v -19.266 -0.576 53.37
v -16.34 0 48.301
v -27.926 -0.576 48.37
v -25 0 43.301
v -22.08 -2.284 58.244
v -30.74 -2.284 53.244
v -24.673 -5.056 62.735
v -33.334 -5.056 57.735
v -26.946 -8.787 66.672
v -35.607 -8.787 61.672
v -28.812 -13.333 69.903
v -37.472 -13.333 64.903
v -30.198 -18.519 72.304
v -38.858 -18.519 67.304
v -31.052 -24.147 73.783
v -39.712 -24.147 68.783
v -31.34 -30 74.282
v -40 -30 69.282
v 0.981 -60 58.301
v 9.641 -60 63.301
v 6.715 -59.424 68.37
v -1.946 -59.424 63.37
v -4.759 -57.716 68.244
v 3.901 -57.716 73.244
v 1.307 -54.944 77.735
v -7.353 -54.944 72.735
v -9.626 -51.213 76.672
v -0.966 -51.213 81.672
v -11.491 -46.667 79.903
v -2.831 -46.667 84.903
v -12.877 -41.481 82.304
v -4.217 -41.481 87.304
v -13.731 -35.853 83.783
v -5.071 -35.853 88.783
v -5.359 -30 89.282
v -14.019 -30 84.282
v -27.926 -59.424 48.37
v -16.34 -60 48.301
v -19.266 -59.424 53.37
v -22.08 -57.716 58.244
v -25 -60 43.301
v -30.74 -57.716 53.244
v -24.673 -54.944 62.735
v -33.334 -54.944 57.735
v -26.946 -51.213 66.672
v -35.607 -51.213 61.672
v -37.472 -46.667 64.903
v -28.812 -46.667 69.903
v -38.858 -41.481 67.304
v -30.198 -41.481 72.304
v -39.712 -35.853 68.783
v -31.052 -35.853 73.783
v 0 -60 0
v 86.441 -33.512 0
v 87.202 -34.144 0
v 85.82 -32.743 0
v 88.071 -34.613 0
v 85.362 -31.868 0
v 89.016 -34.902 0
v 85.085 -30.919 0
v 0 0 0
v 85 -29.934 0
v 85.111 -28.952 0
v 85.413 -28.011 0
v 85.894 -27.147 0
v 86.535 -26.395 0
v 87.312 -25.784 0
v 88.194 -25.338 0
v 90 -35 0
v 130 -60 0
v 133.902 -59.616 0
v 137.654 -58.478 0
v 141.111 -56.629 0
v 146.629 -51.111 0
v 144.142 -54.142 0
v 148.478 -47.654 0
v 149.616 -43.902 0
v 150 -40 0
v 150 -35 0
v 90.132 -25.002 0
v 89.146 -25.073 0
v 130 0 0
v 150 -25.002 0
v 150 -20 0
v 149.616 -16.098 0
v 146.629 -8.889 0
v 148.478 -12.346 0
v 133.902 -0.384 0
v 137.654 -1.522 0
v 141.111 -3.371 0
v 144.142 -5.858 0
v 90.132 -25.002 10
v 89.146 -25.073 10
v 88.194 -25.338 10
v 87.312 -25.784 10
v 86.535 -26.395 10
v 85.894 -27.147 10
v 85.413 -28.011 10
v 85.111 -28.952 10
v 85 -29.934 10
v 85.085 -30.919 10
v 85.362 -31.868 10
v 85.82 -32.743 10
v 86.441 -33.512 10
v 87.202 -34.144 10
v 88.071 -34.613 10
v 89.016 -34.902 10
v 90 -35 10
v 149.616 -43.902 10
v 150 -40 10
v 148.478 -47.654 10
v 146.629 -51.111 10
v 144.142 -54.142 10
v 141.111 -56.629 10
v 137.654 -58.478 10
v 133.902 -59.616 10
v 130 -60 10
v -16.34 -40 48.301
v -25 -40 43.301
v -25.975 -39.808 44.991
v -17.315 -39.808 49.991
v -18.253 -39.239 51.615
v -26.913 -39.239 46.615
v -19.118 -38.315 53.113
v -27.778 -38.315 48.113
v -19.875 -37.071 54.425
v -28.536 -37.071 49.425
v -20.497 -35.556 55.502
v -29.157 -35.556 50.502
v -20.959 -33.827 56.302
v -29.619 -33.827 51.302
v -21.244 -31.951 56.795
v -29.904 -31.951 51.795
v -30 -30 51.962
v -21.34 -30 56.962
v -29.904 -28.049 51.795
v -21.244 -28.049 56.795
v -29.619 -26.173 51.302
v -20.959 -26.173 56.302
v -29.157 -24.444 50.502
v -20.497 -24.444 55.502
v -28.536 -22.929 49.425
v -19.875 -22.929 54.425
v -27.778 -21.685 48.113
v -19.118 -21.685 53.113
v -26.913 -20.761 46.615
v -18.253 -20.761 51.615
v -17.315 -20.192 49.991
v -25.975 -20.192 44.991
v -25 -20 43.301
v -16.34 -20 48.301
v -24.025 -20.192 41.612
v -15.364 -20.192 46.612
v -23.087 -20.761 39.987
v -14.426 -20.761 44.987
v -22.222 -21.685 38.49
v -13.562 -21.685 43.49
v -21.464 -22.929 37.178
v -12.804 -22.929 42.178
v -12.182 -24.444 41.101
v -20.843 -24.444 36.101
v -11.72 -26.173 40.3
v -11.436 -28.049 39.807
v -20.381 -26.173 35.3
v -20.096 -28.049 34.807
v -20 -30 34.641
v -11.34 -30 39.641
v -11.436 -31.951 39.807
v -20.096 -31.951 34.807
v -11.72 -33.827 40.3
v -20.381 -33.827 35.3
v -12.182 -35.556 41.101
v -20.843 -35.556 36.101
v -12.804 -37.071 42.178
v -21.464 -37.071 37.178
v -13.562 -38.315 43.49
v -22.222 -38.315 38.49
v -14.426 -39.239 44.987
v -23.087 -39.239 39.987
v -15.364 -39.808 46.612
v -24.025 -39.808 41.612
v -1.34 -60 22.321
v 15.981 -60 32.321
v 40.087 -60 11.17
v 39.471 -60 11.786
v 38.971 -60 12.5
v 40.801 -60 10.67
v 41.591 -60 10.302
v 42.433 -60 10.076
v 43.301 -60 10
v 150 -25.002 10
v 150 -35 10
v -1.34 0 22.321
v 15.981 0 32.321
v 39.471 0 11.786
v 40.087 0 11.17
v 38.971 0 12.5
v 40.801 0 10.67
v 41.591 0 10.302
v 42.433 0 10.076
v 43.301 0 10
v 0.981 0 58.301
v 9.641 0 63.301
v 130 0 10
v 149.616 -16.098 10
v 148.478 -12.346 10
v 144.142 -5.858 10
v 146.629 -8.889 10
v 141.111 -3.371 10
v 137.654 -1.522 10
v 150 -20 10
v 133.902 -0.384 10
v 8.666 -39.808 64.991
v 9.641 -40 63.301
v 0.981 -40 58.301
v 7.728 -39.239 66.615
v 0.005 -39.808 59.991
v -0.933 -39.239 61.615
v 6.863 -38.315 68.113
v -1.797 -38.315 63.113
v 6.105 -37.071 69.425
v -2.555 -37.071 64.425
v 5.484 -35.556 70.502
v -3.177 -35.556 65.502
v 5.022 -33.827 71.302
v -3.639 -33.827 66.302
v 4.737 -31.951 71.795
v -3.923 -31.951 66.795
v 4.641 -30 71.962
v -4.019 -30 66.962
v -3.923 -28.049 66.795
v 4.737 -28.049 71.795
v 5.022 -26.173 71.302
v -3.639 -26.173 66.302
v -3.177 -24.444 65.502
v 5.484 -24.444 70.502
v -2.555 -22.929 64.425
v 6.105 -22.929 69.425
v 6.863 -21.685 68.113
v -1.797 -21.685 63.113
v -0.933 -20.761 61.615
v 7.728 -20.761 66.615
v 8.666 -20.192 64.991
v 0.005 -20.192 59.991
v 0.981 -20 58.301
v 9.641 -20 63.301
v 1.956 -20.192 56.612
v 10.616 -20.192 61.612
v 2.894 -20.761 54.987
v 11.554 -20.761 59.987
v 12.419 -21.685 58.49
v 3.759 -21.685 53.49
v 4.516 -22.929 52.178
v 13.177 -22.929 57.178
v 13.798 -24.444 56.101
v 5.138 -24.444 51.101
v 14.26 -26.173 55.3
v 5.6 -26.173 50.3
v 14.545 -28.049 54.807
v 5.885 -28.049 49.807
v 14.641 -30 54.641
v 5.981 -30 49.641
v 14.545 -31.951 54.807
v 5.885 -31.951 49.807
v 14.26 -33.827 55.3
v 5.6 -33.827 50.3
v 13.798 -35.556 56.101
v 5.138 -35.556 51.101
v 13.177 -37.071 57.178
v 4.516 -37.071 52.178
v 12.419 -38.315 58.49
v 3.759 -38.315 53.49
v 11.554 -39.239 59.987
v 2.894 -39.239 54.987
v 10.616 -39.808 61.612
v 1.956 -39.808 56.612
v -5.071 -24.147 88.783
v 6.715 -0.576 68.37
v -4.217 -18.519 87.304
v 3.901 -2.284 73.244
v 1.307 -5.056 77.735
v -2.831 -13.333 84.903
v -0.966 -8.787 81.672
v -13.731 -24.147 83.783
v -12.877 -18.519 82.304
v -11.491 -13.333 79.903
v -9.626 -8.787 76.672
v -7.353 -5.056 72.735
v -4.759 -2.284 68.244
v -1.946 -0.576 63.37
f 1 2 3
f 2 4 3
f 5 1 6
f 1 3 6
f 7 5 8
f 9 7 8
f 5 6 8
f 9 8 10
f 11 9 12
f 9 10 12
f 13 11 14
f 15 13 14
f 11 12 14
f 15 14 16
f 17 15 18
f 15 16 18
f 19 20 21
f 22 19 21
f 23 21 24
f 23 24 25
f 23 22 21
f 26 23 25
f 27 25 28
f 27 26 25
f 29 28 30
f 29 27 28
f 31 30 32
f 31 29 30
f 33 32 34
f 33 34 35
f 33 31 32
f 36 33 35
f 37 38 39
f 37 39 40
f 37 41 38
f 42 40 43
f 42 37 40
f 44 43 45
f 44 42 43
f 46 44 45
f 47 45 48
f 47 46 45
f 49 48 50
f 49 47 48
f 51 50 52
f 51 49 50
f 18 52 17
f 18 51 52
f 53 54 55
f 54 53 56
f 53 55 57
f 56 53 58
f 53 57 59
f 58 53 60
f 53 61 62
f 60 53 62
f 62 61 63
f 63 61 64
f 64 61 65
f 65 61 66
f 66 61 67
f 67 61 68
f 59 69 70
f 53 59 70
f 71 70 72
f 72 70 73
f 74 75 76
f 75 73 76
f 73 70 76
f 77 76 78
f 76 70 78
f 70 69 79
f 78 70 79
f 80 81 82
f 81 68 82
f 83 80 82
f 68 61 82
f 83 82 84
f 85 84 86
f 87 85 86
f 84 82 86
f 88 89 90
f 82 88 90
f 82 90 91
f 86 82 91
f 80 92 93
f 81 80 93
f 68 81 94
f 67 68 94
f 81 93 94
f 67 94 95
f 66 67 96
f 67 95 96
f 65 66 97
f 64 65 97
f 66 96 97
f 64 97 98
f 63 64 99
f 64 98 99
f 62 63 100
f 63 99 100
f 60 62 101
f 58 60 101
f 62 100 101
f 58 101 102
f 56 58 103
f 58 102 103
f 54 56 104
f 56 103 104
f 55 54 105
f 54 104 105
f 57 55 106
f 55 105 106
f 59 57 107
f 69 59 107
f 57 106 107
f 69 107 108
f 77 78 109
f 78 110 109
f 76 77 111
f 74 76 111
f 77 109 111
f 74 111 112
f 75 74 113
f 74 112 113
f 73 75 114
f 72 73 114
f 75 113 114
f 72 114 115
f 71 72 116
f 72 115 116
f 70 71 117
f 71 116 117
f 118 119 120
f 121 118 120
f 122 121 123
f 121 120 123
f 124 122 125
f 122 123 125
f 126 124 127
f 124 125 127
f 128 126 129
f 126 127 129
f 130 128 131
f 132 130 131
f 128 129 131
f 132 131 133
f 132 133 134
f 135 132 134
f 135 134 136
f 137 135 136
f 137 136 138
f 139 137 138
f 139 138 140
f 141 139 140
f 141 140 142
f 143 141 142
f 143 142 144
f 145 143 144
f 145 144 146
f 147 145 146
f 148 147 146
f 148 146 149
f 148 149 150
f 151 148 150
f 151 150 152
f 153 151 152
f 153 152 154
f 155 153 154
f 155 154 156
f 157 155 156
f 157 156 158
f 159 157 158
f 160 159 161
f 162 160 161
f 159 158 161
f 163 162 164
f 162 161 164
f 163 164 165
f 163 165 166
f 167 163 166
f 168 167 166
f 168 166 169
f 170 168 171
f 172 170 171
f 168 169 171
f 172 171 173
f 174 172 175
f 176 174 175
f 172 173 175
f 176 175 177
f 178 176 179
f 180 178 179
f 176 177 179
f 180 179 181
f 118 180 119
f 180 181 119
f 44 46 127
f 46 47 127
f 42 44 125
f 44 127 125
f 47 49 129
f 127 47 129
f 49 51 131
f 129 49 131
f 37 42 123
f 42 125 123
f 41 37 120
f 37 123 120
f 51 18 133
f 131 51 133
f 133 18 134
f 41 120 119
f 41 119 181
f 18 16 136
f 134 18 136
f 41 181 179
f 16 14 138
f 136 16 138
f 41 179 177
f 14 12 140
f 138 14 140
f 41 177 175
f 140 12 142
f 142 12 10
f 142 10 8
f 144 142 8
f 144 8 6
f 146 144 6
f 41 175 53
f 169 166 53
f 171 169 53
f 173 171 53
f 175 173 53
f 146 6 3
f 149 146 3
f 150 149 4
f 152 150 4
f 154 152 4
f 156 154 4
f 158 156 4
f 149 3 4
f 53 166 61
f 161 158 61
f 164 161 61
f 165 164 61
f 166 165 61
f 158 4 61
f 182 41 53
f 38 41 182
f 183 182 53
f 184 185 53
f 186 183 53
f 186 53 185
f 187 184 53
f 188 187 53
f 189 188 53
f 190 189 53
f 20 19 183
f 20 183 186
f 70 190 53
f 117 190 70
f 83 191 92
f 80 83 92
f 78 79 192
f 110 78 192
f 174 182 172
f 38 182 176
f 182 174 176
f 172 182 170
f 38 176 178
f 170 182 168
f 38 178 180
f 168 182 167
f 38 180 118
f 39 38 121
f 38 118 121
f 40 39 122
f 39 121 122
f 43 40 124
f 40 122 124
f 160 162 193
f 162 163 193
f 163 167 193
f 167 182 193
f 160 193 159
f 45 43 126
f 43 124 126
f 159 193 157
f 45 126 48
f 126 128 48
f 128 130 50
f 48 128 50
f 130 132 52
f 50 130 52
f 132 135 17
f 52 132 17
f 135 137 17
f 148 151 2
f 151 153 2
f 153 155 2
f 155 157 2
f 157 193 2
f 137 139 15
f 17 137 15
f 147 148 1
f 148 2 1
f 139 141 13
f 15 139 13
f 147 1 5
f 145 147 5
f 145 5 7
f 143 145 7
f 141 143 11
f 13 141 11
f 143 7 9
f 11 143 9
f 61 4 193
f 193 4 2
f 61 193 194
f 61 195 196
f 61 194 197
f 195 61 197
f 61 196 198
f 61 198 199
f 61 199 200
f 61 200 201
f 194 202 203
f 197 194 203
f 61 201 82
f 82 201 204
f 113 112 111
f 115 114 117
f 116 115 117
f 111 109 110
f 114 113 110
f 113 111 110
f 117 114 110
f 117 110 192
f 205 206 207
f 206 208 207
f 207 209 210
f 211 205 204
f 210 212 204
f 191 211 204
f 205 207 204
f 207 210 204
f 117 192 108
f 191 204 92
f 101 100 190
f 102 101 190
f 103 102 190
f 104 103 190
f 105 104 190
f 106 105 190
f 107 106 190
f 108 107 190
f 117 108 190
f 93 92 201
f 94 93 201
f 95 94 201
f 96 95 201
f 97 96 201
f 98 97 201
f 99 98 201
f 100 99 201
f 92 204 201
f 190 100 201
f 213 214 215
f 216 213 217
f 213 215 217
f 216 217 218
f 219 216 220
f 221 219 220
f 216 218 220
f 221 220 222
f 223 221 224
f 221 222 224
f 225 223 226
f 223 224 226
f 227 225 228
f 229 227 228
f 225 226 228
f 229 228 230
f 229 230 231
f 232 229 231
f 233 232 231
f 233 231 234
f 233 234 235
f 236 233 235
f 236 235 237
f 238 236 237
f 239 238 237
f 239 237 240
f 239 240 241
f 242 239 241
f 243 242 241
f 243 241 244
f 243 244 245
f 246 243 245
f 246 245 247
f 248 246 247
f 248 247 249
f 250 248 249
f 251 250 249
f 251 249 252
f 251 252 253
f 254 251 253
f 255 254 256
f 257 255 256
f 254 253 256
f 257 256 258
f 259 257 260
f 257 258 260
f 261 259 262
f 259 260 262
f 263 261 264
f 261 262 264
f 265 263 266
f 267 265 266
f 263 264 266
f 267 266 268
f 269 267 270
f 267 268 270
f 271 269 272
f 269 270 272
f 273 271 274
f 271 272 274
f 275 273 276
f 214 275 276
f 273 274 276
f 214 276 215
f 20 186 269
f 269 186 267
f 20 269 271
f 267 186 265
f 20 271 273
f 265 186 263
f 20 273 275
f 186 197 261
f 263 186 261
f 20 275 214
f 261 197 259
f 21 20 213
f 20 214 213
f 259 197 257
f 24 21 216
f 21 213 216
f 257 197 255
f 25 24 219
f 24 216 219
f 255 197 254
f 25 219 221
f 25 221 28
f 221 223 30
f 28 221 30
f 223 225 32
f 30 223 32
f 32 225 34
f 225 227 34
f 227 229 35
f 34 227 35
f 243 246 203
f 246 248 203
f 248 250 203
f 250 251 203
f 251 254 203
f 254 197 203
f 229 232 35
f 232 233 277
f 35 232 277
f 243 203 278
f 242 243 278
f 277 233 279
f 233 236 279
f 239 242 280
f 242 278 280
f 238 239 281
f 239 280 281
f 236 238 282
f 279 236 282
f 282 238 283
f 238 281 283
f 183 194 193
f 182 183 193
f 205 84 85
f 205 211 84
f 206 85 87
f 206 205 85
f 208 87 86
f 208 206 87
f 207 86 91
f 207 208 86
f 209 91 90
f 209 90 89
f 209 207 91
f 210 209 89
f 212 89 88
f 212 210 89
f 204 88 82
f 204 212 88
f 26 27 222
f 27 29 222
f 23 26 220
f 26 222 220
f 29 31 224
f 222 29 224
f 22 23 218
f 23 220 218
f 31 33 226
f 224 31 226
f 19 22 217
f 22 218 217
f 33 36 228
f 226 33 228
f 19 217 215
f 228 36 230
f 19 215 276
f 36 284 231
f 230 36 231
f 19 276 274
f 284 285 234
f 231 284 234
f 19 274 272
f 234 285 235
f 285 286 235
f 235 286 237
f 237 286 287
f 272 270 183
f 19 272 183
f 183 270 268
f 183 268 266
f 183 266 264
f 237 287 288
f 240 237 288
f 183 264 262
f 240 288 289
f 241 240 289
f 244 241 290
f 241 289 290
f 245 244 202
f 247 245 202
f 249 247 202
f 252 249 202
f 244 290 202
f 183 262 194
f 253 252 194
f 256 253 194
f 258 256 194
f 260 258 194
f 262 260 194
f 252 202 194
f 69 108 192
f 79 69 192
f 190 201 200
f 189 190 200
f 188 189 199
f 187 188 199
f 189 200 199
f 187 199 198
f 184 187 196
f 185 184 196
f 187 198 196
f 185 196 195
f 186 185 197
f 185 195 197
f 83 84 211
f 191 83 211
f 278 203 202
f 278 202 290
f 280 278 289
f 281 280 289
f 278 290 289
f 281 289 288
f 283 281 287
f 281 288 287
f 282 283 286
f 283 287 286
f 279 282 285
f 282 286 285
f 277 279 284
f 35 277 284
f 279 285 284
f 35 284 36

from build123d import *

# Parameters (mm, degrees)
F1_DEPTH = 60
F2_R     = 20
F4_DEPTH = 10.001
F5_R     = 29.99999
F7_D     = 20


# Not quite as in the source:
# - a fillet or chamfer is up to 0.001 mm smaller than in the source, because OpenCascade refuses the exact size


with BuildPart() as f1:
    # F0 (on Front) → F1 (new body)
    with BuildSketch(Plane.XZ):
        with BuildLine():
            Line((-40, 69.2820323028), (0, 0))
            Line((0, 0), (150, 0))
            Line((150, 0), (150, 10))
            Line((150, 10), (43.3012701892, 10))
            ThreePointArc((43.3012701892, 10), (40.8012701892, 10.6698729811), (38.9711431703, 12.5))
            Line((38.9711431703, 12.5), (-5.3589838486, 89.2820323028))
            Line((-5.3589838486, 89.2820323028), (-14.0192378865, 84.2820323028))
            Line((-14.0192378865, 84.2820323028), (15.9807621135, 32.3205080757))
            Line((15.9807621135, 32.3205080757), (-1.3397459622, 22.3205080757))
            Line((-1.3397459622, 22.3205080757), (-31.3397459622, 74.2820323028))
            Line((-31.3397459622, 74.2820323028), (-40, 69.2820323028))
        make_face()
    extrude(amount=F1_DEPTH)

    # F2
    f2_edges = [f1.edges().sort_by_distance(p)[0] for p in [
        (150, 0, 5),
        (150, -60, 5),
    ]]
    fillet(f2_edges, radius=F2_R)

    # F3 (on face) → F4 (cut, through all)
    with BuildSketch(Plane.XY.offset(10)):
        with BuildLine():
            ThreePointArc((90, -35), (93.5355339059, -33.5355339059), (95, -30))
            ThreePointArc((95, -30), (93.5818777161, -26.5114255022), (90.1319391892, -25.0017410981))
            ThreePointArc((90.1319391892, -25.0017410981), (85.0004352935, -29.9340246617), (90, -35))
        make_face()
        with BuildLine():
            ThreePointArc((90.1319391892, -25.0017410981), (93.5818777161, -26.5114255022), (95, -30))
            ThreePointArc((95, -30), (93.5355339059, -33.5355339059), (90, -35))
            Line((90, -35), (150, -35))
            Line((150, -35), (150, -25.0017410981))
            Line((150, -25.0017410981), (90.1319391892, -25.0017410981))
        make_face()
    extrude(amount=-F4_DEPTH, mode=Mode.SUBTRACT)

    # F5 (radius 30 in the source; OpenCascade refuses exactly that, so slightly less here)
    f5_edges = [f1.edges().sort_by_distance(p)[0] for p in [
        (-9.689111, -60, 86.782032),
        (-9.689111, 0, 86.782032),
        (-35.669873, -60, 71.782032),
        (-35.669873, 0, 71.782032),
    ]]
    fillet(f5_edges, radius=F5_R)

    # F7 (through all)
    with Locations(Plane(origin=(34.6410161514, 0, 20), x_dir=(0, 1, 0), z_dir=(0.8660254038, 0, 0.5))):
        with Locations((-30, 50)):
            Hole(F7_D / 2)


solid = f1.part
